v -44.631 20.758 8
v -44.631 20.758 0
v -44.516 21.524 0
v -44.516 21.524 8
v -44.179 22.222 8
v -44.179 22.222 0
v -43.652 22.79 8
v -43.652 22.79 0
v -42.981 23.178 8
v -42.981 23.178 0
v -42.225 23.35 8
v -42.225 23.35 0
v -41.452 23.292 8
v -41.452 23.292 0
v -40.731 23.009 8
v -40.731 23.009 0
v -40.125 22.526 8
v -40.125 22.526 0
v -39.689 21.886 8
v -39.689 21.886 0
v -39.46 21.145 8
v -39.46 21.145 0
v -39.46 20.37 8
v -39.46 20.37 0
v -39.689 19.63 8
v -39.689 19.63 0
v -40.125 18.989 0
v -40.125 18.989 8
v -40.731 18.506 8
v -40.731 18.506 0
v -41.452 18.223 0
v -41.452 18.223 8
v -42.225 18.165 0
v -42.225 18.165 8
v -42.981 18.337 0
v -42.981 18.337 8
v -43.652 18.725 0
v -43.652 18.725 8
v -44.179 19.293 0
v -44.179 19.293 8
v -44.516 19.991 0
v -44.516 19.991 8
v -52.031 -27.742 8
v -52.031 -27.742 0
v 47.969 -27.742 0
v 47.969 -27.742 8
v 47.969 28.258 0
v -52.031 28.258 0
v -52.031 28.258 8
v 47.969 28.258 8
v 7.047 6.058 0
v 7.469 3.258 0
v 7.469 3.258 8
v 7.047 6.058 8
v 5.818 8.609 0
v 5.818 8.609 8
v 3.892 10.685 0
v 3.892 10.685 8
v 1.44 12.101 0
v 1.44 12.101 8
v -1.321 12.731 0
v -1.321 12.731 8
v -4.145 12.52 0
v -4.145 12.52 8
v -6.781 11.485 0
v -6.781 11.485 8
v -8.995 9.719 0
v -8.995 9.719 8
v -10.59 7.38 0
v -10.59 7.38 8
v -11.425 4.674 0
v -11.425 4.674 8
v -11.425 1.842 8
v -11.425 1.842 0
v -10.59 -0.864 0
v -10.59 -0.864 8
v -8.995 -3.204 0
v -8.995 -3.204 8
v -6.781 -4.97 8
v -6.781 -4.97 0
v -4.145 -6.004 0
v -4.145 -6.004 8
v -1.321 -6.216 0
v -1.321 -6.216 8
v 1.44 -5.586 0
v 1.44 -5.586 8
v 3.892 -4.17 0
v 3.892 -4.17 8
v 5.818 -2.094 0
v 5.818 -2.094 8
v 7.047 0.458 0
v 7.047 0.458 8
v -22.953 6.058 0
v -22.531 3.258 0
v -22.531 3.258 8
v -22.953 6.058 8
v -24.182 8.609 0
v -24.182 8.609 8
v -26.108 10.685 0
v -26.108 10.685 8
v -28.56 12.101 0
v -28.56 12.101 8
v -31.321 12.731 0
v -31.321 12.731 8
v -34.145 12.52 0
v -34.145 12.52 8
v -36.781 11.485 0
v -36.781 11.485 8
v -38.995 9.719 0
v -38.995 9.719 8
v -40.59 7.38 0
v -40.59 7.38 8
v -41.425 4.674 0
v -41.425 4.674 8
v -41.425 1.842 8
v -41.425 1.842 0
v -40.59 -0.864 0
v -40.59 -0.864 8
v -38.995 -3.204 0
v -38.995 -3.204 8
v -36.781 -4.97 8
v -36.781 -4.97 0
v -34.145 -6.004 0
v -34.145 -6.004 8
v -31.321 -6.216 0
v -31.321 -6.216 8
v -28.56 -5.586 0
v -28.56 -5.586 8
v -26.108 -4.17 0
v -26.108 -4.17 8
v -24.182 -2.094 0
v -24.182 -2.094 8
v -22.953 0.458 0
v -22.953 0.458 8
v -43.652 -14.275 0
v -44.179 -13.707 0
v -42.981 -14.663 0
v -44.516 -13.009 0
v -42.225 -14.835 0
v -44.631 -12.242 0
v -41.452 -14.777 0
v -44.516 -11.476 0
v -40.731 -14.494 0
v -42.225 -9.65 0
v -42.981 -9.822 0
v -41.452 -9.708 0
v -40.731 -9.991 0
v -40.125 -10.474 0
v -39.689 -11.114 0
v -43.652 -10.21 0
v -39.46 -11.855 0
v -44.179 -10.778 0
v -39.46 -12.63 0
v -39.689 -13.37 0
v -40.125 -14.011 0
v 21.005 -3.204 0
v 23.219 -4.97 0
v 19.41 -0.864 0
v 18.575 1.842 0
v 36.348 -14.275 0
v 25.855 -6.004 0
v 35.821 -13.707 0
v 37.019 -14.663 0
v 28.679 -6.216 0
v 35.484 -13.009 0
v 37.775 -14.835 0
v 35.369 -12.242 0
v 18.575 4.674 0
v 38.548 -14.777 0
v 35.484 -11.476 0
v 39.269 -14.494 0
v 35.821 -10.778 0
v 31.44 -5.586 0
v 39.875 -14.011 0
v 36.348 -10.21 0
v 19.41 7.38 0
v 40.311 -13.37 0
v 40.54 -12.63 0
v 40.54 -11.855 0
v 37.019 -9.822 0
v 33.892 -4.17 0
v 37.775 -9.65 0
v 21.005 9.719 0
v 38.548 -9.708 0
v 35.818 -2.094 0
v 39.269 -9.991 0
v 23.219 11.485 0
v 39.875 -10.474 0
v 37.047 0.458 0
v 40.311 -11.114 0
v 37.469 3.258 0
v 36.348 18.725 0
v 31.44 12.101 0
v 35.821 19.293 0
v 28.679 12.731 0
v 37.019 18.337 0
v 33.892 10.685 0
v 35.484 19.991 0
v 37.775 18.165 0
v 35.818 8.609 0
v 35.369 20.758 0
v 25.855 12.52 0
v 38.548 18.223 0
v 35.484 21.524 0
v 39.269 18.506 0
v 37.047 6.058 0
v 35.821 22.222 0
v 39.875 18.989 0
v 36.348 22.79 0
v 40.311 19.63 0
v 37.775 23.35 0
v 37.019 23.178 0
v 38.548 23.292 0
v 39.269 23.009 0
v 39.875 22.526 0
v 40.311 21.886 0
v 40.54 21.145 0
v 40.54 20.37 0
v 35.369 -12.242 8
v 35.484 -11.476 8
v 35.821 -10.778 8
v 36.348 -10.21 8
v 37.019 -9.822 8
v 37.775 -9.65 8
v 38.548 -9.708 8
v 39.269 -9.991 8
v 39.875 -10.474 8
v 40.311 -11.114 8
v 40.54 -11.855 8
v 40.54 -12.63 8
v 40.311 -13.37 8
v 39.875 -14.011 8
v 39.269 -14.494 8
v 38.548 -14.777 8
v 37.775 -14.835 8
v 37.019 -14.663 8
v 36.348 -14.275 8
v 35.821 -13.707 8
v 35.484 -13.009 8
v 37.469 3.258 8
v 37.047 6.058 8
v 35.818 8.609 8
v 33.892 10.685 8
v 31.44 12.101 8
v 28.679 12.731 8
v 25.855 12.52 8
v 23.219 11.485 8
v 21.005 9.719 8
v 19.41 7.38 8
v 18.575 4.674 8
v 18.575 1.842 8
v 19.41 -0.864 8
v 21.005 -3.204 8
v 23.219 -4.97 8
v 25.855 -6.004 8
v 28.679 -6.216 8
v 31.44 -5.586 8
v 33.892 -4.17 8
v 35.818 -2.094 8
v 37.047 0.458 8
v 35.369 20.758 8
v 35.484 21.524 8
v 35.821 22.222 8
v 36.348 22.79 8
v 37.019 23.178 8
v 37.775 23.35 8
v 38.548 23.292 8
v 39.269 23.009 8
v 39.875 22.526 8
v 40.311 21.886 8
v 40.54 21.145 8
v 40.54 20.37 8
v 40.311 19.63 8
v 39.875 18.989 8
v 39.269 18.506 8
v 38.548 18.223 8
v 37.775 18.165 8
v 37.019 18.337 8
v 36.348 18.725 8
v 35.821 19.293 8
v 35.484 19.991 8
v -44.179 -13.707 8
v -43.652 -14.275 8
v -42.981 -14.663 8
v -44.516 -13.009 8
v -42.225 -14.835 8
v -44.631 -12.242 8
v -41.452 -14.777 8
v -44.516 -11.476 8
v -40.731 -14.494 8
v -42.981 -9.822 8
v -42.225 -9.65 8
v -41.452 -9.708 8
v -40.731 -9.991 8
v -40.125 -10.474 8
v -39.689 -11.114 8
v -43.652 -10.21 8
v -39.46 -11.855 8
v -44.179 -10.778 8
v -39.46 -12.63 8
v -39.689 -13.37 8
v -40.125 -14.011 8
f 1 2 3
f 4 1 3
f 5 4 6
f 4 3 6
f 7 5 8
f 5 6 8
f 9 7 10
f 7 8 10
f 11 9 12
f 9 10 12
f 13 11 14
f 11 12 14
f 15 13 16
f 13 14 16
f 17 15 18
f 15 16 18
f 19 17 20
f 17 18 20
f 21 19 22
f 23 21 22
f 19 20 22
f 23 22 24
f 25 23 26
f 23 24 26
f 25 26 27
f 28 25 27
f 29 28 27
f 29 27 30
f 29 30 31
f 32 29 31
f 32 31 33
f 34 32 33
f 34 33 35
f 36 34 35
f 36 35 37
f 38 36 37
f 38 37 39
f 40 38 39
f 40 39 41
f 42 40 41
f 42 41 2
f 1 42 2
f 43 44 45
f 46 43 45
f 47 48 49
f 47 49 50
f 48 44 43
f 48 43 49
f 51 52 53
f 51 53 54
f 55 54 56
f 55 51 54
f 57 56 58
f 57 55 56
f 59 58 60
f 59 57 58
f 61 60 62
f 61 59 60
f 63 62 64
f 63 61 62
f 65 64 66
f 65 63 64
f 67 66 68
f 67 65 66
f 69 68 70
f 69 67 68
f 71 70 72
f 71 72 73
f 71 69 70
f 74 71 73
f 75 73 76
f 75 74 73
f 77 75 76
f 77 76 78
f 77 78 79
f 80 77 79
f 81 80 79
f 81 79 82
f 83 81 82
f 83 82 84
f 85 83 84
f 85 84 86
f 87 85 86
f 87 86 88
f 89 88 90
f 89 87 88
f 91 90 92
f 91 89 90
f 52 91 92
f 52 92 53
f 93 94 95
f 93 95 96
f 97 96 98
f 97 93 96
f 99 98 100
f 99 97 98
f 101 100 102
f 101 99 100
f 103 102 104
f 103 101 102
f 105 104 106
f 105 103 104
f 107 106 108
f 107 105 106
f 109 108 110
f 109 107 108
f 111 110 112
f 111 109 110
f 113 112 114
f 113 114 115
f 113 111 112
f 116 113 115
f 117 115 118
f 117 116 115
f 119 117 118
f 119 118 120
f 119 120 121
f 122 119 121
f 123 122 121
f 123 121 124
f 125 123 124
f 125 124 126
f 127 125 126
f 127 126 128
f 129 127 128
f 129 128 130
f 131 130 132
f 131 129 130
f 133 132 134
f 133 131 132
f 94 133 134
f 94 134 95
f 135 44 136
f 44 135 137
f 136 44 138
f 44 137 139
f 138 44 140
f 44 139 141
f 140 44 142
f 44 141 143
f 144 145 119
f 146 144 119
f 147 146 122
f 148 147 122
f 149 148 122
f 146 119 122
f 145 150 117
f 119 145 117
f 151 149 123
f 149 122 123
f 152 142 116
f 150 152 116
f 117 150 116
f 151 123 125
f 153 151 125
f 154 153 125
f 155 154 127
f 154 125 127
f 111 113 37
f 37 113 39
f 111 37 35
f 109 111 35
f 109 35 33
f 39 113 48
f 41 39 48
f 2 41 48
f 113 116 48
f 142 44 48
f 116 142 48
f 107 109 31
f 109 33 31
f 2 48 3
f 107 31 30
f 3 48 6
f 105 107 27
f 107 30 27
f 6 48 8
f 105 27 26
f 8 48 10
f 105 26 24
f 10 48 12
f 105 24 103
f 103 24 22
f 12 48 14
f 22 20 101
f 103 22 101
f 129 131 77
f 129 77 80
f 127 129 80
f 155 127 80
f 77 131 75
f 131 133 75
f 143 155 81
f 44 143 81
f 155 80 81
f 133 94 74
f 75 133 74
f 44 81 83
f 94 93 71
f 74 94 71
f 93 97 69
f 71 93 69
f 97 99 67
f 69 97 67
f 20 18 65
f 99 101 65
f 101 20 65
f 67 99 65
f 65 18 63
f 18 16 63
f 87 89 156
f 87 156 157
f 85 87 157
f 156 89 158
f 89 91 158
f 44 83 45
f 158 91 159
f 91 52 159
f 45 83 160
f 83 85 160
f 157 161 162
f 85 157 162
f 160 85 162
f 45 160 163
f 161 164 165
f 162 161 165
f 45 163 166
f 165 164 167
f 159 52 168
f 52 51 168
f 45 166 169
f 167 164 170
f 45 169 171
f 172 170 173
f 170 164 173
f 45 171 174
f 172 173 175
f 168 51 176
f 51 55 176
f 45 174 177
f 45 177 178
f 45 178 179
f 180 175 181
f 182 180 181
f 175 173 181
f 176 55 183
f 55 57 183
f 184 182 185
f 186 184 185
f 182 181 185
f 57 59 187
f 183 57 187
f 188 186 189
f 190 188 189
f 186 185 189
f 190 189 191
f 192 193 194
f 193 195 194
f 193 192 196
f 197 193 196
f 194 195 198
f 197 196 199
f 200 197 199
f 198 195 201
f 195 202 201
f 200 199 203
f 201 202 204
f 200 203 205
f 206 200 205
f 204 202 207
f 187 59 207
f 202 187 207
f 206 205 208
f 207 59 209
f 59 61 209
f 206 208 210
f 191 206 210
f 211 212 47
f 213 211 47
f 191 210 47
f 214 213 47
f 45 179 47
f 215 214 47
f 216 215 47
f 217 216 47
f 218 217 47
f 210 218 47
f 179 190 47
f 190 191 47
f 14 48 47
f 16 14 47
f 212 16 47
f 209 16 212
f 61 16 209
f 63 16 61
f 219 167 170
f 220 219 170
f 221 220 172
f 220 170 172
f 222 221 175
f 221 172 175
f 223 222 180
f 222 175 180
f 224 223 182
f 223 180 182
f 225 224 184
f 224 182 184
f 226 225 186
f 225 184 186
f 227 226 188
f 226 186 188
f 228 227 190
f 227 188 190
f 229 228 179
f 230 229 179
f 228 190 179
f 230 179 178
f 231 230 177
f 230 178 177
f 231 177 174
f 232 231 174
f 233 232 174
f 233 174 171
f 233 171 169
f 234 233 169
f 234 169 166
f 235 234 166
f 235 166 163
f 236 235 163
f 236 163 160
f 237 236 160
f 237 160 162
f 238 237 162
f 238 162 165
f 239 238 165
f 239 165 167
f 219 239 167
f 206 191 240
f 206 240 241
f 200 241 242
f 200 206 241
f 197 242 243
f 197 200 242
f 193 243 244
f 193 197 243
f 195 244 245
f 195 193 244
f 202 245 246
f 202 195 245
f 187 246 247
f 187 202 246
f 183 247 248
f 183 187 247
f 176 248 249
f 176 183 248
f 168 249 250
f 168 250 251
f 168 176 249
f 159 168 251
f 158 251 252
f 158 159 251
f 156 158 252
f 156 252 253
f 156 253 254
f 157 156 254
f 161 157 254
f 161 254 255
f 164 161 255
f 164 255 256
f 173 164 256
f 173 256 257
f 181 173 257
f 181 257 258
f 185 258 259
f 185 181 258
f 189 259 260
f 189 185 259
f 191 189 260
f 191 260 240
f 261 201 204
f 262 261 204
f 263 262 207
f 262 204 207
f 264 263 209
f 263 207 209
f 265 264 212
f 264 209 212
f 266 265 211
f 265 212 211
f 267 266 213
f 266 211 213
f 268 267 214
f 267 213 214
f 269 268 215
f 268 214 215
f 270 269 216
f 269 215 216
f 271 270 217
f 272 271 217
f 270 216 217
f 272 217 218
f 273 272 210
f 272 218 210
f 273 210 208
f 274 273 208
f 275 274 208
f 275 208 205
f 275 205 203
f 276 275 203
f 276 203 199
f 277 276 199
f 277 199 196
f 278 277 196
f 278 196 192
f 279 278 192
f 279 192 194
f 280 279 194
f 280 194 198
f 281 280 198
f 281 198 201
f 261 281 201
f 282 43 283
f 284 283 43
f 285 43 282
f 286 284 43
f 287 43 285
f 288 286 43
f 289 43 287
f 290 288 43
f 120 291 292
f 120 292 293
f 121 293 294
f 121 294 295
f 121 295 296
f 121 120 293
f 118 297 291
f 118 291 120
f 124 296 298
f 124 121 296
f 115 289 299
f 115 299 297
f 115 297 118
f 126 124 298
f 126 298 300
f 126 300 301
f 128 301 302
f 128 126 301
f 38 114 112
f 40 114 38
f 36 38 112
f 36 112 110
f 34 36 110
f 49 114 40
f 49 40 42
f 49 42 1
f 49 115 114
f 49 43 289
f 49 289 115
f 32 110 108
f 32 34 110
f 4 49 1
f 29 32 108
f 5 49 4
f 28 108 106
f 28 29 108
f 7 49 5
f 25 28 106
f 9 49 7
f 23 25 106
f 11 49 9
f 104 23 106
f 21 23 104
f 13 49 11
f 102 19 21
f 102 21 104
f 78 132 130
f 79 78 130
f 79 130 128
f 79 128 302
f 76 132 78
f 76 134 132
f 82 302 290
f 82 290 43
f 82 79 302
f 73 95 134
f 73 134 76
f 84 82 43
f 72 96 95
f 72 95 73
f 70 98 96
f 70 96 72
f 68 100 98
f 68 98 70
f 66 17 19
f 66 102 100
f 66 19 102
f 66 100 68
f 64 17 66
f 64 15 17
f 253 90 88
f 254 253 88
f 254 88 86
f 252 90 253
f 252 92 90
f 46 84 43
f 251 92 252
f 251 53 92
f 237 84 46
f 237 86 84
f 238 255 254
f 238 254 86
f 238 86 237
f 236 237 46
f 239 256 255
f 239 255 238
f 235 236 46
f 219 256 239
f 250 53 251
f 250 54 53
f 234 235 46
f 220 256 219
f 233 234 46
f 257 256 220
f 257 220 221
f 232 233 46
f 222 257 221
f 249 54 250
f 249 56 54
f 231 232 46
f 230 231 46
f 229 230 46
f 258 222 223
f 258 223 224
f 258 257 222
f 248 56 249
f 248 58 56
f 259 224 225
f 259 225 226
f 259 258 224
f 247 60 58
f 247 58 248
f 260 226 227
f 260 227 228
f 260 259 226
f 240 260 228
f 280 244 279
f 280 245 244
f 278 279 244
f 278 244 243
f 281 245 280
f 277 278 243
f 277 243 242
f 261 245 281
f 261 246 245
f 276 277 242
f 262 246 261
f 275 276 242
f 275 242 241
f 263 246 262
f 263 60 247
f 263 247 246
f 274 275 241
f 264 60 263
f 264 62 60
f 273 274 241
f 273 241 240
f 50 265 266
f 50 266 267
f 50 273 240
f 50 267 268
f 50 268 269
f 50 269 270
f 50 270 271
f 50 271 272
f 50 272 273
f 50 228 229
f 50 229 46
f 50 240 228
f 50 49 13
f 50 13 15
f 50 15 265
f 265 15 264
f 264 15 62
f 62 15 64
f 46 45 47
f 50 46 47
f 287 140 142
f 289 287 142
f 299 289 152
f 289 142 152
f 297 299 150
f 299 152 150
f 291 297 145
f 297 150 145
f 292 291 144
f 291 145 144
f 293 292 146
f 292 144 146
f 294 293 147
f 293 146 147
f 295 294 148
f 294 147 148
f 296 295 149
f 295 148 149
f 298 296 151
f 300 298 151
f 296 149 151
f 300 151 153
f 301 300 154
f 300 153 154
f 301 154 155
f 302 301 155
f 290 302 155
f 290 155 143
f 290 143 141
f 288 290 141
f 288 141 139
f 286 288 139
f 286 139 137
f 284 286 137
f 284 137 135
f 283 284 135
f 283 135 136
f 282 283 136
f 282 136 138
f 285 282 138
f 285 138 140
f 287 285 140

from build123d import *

# Parameters (mm, degrees)
IZIM1_W                     = 100
IZIM1_H                     = 56
IZIM1_R                     = 9.5
Y_KSEKLIK_EKSTR_ZYON1_DEPTH = 8
IZIM2_R                     = 2.6
KES_EKSTR_ZYON1_DEPTH       = 10


with BuildPart() as part:
    # Çizim1 → Yükseklik-Ekstrüzyon1 (new body)
    with BuildSketch(Plane.XY):
        with Locations((-2.031053151, 0.257686676)):
            Rectangle(IZIM1_W, IZIM1_H)
        with Locations((-32.031053151, 3.257686676)):
            Circle(IZIM1_R, mode=Mode.SUBTRACT)
        with Locations((27.968946849, 3.257686676)):
            Circle(IZIM1_R, mode=Mode.SUBTRACT)
        with Locations((-2.031053151, 3.257686676)):
            Circle(IZIM1_R, mode=Mode.SUBTRACT)
    extrude(amount=Y_KSEKLIK_EKSTR_ZYON1_DEPTH)

    # Çizim2 → Kes-Ekstrüzyon1 (cut)
    with BuildSketch(Plane(origin=(0, 0, 0), x_dir=(-1, 0, 0), z_dir=(0, 0, -1))):
        with Locations((-37.968946849, 20.757686676)):
            Circle(IZIM2_R)
        with Locations((-37.968946849, -12.242313324)):
            Circle(IZIM2_R)
        with Locations((42.031053151, -12.242313324)):
            Circle(IZIM2_R)
        with Locations((42.031053151, 20.757686676)):
            Circle(IZIM2_R)
    extrude(amount=-KES_EKSTR_ZYON1_DEPTH, mode=Mode.SUBTRACT)


solid = part.part
